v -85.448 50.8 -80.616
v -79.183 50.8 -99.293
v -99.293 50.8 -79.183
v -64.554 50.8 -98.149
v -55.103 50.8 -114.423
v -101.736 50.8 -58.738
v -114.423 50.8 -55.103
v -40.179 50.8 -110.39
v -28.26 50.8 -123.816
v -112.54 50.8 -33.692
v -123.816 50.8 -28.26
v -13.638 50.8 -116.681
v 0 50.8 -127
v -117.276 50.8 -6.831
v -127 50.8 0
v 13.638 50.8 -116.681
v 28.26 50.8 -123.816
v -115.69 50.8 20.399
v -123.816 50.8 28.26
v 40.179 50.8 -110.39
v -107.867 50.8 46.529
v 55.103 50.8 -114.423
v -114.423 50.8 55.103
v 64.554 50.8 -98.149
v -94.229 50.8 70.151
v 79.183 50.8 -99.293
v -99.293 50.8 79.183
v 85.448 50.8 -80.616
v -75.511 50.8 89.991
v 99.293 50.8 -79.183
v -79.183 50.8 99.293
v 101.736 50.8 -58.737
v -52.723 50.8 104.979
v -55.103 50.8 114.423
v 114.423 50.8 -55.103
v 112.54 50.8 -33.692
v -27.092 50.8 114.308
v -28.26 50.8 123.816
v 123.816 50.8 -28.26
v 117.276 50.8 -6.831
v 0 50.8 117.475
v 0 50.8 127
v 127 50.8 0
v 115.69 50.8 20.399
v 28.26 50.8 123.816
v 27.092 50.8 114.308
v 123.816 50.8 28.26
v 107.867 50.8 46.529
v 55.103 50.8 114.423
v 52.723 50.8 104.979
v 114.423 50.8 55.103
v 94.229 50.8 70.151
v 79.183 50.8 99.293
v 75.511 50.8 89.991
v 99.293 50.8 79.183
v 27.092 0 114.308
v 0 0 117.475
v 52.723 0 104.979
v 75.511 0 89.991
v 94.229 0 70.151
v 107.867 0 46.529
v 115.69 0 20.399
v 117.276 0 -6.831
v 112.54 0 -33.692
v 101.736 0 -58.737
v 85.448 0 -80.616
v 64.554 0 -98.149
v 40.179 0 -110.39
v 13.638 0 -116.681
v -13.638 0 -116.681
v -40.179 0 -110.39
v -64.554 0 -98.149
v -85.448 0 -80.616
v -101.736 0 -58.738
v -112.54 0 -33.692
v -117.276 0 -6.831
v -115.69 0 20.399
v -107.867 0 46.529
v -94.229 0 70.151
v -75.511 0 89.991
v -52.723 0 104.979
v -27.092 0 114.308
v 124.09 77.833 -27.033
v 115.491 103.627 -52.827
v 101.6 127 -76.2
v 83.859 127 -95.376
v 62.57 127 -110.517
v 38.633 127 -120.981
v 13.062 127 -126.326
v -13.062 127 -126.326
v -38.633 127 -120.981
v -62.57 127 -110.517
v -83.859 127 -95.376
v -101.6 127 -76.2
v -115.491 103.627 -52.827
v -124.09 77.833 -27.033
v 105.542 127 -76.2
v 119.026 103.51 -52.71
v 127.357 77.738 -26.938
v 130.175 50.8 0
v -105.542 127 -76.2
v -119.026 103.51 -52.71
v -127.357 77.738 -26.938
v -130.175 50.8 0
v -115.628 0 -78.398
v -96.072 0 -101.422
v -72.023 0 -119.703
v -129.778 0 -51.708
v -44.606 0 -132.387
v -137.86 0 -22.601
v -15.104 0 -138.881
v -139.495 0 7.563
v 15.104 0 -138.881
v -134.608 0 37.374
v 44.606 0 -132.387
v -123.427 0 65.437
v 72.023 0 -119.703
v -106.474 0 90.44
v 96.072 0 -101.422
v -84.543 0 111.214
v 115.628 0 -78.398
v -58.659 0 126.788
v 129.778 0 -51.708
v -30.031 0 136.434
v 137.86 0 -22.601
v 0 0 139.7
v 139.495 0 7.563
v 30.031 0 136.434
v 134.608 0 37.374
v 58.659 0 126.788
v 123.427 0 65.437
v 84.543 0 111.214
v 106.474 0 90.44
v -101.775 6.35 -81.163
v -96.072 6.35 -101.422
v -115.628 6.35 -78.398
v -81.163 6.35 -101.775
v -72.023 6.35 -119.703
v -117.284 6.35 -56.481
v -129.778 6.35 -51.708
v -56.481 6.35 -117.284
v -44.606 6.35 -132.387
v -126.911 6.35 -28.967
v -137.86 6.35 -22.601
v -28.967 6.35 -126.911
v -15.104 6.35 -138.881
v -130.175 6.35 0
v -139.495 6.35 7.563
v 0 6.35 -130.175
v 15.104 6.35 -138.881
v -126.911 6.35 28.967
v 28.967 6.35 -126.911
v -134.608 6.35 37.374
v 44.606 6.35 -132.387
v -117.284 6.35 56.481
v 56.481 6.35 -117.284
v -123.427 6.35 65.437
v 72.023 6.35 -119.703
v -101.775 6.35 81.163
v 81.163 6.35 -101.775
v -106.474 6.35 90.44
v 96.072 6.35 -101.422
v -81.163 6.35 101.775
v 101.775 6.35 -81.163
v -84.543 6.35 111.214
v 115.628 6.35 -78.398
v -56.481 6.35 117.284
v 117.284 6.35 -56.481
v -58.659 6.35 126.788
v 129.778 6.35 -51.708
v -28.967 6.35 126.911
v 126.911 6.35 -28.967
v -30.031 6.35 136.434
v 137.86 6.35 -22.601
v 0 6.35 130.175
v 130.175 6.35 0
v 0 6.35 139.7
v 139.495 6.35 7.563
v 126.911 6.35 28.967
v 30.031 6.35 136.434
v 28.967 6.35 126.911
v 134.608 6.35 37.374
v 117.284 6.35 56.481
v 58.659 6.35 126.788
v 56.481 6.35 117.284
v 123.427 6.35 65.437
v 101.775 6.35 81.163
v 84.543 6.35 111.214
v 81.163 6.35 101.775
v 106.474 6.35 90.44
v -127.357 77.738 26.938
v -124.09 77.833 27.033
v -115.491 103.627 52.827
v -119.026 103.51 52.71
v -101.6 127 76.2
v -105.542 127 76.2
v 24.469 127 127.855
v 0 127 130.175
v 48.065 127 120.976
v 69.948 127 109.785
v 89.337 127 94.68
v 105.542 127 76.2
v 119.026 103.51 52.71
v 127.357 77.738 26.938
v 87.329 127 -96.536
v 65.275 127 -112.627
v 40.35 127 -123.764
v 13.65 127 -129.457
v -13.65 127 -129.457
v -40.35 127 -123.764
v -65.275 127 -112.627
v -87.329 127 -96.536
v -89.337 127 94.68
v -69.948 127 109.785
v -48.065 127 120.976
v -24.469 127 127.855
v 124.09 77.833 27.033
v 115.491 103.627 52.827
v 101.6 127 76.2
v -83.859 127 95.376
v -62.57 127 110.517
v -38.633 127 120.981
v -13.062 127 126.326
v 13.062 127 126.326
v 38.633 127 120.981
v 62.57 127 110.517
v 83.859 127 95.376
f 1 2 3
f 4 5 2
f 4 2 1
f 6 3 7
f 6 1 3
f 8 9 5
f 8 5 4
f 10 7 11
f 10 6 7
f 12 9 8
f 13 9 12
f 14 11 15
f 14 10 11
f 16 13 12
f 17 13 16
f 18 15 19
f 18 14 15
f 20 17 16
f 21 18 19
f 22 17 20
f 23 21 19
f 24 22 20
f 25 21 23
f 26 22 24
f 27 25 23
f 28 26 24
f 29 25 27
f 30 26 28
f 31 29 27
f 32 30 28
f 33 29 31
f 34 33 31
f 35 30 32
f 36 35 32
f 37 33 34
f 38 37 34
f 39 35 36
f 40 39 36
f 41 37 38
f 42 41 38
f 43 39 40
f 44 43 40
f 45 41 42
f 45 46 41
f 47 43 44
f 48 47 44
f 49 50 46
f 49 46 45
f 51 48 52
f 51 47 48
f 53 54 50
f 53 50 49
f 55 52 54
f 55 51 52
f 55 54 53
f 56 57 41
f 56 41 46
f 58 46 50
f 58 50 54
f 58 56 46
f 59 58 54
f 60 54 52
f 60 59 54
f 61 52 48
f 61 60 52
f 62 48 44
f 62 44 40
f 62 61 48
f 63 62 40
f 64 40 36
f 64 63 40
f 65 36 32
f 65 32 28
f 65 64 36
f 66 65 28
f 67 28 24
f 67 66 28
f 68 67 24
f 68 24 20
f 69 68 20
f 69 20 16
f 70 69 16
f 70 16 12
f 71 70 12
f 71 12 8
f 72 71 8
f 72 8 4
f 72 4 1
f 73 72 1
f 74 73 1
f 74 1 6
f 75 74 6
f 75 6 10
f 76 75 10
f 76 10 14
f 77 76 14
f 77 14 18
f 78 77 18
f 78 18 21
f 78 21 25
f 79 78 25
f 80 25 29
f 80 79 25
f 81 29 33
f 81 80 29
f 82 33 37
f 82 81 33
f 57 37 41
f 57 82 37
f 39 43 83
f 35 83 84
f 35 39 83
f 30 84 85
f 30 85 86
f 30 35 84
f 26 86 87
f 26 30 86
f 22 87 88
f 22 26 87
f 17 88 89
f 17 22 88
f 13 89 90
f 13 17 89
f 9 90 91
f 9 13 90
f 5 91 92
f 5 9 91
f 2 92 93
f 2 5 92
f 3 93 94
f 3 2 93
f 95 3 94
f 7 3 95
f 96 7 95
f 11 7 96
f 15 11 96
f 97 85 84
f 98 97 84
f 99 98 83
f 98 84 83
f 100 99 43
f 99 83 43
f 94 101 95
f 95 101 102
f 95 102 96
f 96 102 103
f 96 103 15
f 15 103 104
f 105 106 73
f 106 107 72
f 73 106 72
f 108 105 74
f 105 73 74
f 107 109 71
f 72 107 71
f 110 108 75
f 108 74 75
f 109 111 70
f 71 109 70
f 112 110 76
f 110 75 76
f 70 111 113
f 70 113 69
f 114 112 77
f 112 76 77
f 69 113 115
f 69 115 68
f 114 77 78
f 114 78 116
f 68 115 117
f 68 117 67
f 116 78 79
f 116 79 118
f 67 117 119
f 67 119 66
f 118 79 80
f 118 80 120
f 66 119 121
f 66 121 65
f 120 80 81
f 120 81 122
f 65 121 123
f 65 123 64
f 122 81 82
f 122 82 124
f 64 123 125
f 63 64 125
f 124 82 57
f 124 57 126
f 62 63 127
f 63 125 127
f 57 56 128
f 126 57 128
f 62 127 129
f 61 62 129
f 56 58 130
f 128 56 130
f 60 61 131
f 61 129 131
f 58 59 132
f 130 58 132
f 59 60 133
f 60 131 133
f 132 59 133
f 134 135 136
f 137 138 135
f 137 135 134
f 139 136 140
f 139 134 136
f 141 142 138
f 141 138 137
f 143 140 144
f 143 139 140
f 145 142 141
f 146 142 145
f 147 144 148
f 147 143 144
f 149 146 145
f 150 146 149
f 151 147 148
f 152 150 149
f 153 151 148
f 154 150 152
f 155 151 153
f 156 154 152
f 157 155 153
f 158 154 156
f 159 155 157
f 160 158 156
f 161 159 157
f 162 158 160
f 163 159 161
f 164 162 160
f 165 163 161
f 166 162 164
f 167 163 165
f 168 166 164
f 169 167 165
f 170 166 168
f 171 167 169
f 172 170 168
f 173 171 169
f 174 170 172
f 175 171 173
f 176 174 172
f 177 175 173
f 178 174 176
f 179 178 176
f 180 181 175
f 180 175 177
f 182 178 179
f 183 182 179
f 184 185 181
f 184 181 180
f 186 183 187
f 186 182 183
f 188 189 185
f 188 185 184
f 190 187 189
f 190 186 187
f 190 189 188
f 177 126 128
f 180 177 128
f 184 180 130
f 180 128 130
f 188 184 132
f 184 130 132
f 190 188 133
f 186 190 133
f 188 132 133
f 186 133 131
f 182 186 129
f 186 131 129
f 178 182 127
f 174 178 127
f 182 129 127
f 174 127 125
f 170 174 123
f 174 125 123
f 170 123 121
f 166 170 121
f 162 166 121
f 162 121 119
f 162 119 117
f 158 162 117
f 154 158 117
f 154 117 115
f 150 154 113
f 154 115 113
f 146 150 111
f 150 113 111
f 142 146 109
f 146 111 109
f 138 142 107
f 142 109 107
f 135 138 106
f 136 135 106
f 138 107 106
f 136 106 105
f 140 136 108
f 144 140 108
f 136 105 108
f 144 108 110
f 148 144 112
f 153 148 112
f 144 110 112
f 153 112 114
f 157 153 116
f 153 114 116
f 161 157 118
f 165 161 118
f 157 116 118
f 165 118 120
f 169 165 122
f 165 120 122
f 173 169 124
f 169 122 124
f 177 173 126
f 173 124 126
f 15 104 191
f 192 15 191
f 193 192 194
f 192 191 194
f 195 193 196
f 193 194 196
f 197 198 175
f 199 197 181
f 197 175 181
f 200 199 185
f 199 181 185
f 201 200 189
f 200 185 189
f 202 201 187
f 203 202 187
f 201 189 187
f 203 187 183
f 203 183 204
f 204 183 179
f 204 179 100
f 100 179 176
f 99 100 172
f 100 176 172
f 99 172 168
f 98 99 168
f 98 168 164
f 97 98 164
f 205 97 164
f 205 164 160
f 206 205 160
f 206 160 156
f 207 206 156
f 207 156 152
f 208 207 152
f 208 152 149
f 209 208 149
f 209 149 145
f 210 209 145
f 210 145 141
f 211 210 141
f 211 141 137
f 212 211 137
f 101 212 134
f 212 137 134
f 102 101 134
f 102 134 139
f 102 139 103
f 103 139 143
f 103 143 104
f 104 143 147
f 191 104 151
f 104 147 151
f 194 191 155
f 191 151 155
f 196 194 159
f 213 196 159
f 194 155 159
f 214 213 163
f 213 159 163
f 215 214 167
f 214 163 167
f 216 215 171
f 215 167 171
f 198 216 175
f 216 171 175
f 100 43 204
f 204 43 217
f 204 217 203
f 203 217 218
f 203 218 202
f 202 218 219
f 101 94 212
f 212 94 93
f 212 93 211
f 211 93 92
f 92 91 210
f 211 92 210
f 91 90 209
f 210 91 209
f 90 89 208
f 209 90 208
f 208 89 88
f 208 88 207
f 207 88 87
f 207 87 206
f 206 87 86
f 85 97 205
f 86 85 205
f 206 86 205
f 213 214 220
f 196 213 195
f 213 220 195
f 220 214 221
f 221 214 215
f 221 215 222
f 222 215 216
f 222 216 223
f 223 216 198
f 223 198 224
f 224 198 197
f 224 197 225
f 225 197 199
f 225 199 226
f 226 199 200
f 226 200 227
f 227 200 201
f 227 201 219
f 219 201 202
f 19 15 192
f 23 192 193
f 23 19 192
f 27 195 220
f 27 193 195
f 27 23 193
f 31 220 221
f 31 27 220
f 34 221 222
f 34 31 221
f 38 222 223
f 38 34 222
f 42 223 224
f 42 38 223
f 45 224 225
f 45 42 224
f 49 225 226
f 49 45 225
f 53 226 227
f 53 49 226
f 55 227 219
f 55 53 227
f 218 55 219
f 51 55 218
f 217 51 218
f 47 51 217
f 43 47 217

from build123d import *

# Parameters (mm, degrees)
SKETCH1_R               = 127
SKETCH1_R_2             = 117.475
BOSS_EXTRUDE1_DEPTH     = 50.8
SKETCH1_3_R             = 130.175
SKETCH1_3_R_2           = 127
BOSS_EXTRUDE2_DEPTH     = 254
SKETCH1_4_R             = 139.7
SKETCH1_4_R_2           = 130.175
BOSS_EXTRUDE3_DEPTH     = 6.35
SKETCH2_W               = 130.175
SKETCH2_H               = 127
CUT_EXTRUDE1_DEPTH      = 235.864173513
CUT_EXTRUDE1_DEPTH_BACK = 235.864173513


with BuildPart() as part:
    # Sketch1 → Boss-Extrude1 (new body)
    with BuildSketch(Plane(origin=(0, 0, 0), x_dir=(1, 0, 0), z_dir=(0, 1, 0))):
        Circle(SKETCH1_R)
        Circle(SKETCH1_R_2, mode=Mode.SUBTRACT)
    extrude(amount=BOSS_EXTRUDE1_DEPTH)

    # Sketch1<3> → Boss-Extrude2 (add)
    with BuildSketch(Plane(origin=(0, 0, 0), x_dir=(1, 0, 0), z_dir=(0, 1, 0))):
        Circle(SKETCH1_3_R)
        Circle(SKETCH1_3_R_2, mode=Mode.SUBTRACT)
    extrude(amount=BOSS_EXTRUDE2_DEPTH)

    # Sketch1<4> → Boss-Extrude3 (add)
    with BuildSketch(Plane(origin=(0, 0, 0), x_dir=(1, 0, 0), z_dir=(0, 1, 0))):
        Circle(SKETCH1_4_R)
        Circle(SKETCH1_4_R_2, mode=Mode.SUBTRACT)
    extrude(amount=BOSS_EXTRUDE3_DEPTH)

    # Sketch2 → Cut-Revolve4 (revolve, cut)
    with BuildSketch(Plane(origin=(0, 0, 0), x_dir=(0, 0, -1), z_dir=(1, 0, 0))):
        with Locations((-65.0875, 190.5)):
            Rectangle(SKETCH2_W, SKETCH2_H)
    revolve(axis=Axis((0, 254, 0), (0, -1, 0)), mode=Mode.SUBTRACT)

    # Sketch3 → Cut-Extrude1 (cut, two sides: drawn at the far end of the back side and taken through both)
    with BuildSketch(Plane(origin=(0, 0, 0), x_dir=(0, 0, -1), z_dir=(1, 0, 0)).offset(-CUT_EXTRUDE1_DEPTH_BACK)):
        Polygon((-76.2, 127), (76.2, 127), (0, 50.8), align=None)
    extrude(amount=CUT_EXTRUDE1_DEPTH + CUT_EXTRUDE1_DEPTH_BACK, mode=Mode.SUBTRACT)


solid = part.part
